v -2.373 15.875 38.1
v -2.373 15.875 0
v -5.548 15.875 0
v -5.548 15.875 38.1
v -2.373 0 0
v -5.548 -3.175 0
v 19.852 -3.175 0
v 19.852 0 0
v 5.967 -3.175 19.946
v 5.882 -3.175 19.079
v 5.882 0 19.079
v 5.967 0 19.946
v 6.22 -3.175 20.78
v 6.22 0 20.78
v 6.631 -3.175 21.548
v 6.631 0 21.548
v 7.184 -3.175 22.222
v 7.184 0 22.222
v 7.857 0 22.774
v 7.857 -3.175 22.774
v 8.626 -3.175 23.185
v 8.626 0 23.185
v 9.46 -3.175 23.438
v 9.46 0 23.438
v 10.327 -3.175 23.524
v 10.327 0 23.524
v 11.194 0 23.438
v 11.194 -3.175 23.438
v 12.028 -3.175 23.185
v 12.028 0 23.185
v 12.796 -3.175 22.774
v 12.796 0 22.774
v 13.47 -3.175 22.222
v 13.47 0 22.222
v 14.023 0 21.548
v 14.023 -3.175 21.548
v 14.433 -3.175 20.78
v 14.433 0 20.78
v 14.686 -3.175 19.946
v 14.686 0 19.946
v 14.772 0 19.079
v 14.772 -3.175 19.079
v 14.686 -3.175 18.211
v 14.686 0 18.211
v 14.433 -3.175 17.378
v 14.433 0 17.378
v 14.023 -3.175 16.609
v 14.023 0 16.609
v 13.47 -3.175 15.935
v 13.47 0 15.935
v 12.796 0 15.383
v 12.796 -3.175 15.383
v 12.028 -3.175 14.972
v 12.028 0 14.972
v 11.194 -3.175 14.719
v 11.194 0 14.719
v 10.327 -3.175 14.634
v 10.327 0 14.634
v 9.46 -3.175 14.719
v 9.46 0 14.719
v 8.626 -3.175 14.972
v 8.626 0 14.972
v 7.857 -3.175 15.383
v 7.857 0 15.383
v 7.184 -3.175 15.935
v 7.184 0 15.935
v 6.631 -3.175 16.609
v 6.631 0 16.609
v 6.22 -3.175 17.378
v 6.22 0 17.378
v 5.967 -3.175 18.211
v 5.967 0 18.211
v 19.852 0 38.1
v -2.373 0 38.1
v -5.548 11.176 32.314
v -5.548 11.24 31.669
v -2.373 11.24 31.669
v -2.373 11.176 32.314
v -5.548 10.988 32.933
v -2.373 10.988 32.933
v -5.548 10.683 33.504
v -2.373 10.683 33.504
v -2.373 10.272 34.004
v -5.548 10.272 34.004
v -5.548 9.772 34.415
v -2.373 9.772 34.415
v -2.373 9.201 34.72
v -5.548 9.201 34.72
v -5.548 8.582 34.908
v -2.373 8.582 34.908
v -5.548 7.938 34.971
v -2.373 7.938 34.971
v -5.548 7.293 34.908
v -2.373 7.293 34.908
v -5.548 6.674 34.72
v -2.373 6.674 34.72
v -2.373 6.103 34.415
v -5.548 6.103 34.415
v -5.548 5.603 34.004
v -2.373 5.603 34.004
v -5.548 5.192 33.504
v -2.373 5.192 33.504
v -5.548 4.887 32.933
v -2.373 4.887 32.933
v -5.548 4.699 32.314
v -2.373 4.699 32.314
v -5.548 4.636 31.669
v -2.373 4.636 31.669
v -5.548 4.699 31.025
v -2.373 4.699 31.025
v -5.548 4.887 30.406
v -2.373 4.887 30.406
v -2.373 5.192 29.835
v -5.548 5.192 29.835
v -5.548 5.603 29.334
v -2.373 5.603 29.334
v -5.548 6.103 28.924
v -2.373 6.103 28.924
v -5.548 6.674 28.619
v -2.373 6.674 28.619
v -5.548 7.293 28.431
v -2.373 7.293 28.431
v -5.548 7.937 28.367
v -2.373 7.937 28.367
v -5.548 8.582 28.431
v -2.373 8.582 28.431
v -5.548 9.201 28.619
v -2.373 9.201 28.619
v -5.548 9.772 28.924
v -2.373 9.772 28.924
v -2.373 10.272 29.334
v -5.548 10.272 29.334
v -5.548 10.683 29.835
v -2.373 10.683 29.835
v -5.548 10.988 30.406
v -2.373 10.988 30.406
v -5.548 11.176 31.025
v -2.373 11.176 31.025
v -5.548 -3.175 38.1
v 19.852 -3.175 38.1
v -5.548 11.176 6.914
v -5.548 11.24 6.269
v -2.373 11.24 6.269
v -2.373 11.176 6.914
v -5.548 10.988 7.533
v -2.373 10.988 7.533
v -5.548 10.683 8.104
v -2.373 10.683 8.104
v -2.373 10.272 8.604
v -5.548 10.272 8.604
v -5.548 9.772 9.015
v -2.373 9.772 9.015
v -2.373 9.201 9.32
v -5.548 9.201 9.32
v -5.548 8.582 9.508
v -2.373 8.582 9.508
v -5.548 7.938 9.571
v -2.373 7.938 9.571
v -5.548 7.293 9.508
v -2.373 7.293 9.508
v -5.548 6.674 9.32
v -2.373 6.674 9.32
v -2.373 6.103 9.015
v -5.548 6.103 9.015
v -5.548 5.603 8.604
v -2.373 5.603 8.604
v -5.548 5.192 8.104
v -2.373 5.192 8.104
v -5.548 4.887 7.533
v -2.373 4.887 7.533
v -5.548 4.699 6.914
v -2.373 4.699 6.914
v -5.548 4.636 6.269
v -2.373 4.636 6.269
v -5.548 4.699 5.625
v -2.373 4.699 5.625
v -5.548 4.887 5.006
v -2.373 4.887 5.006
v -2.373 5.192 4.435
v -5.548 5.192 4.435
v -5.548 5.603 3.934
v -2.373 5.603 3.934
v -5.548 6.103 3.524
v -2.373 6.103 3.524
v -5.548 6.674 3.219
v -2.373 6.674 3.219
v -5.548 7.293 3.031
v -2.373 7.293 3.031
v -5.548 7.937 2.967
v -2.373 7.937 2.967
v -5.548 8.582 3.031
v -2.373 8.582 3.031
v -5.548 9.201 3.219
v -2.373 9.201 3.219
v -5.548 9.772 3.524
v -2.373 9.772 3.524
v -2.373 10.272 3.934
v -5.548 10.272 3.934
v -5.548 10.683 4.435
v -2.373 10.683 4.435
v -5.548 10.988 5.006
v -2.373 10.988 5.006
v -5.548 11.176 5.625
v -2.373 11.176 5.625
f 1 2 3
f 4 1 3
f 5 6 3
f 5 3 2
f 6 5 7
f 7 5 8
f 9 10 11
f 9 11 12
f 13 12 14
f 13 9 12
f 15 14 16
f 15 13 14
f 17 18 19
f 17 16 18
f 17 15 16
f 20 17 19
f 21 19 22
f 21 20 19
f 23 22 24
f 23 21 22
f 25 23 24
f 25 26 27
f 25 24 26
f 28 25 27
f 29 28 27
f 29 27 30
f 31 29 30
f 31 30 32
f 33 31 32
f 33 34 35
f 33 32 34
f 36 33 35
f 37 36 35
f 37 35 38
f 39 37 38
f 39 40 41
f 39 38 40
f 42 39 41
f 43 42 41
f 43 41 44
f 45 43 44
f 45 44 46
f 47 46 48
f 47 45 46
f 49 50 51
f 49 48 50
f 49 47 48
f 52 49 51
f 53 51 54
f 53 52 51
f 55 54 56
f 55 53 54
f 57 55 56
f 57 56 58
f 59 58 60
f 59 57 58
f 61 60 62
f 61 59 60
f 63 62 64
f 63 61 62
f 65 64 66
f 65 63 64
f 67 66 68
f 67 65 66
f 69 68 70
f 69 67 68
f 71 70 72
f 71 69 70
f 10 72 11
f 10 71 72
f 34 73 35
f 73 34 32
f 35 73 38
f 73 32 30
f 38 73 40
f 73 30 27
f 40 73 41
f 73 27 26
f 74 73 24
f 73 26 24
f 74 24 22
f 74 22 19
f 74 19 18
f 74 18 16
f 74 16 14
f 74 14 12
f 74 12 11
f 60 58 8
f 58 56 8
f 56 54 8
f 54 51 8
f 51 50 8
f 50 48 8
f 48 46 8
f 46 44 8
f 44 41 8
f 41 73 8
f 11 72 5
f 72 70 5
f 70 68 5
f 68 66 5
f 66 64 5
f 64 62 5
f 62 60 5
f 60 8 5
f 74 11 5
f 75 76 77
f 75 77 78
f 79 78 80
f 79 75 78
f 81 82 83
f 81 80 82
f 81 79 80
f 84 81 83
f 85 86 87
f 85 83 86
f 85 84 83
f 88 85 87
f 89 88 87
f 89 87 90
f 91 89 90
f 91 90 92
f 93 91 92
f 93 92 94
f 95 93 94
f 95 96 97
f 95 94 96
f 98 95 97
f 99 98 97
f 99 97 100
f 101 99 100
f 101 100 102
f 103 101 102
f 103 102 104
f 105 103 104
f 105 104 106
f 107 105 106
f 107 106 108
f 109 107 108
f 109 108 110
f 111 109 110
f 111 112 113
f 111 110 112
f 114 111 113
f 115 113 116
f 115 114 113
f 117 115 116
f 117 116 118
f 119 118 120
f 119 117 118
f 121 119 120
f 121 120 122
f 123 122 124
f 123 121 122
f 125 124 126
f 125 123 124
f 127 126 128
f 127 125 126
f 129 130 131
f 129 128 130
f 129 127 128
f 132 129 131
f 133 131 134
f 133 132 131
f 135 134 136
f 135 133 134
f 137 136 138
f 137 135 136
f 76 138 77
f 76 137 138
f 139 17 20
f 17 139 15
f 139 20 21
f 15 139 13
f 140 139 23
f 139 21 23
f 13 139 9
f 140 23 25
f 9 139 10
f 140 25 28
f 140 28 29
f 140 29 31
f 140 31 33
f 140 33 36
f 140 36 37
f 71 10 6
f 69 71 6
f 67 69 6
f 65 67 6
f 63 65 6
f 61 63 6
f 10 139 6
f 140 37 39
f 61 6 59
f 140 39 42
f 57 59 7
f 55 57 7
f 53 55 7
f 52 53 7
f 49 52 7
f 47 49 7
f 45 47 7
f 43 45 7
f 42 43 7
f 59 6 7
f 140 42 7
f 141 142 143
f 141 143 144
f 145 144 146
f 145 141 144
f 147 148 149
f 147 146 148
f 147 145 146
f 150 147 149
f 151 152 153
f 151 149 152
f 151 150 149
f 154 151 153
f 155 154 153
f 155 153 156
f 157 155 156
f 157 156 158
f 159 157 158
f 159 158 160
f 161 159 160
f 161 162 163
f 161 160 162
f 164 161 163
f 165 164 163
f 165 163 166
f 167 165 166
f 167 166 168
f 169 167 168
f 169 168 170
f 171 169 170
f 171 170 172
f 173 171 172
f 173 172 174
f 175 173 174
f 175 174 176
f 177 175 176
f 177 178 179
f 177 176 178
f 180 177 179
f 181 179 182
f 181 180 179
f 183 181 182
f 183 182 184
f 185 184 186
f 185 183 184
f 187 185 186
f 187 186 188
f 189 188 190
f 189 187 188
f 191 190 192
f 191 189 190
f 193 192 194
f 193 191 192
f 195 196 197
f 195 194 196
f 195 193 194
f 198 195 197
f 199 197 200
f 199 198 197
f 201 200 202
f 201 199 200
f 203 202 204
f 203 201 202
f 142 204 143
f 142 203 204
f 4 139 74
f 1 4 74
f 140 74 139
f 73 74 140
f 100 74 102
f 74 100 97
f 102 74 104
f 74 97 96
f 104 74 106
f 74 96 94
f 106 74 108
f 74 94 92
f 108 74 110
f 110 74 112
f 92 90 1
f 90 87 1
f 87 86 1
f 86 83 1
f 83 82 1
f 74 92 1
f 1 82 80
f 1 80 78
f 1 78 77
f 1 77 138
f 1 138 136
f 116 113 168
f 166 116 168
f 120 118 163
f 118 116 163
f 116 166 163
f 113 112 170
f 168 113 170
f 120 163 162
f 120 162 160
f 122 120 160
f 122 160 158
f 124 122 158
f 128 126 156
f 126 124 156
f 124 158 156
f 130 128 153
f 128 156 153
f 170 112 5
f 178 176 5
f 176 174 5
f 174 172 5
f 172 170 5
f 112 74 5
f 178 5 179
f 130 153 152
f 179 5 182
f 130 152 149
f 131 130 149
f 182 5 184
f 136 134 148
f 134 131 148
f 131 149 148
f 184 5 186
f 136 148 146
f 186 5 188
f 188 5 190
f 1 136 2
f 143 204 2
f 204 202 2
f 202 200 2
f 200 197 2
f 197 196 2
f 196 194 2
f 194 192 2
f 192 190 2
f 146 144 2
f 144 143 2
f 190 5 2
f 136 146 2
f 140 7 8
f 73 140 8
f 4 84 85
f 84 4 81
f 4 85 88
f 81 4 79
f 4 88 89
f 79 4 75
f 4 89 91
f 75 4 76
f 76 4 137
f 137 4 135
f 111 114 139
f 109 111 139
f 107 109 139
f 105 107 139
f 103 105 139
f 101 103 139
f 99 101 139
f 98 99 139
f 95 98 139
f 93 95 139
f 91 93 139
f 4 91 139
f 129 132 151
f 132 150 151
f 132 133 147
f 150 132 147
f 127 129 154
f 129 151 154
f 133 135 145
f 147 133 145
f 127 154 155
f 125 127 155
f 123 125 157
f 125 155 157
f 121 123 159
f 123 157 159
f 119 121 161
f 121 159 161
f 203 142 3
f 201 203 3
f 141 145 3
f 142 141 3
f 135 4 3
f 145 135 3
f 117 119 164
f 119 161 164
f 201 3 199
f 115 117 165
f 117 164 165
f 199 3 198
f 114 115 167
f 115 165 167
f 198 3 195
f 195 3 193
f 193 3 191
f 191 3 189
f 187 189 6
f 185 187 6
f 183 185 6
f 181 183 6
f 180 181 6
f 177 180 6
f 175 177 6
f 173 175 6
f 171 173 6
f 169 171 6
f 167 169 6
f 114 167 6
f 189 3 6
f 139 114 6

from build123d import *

# Parameters (mm, degrees)
BOSS_EXTRUDE2_DEPTH     = 38.1
CUT_EXTRUDE1_DEPTH      = 46.800854849
CUT_EXTRUDE1_DEPTH_BACK = 46.800854849
SKETCH2_R               = 4.445
CUT_EXTRUDE3_DEPTH      = 47.878313216
CUT_EXTRUDE3_DEPTH_BACK = 47.878313216
SKETCH3_R               = 3.302


with BuildPart() as part:
    # Sketch1 → Boss-Extrude2 (new body)
    with BuildSketch(Plane.XY):
        Polygon((-5.548232323, 15.875), (-5.548232323, -3.175), (19.851767677, -3.175), (19.851767677, 0), (-2.373232323, 0), (-2.373232323, 15.875), align=None)
    extrude(amount=BOSS_EXTRUDE2_DEPTH)

    # Sketch2 → Cut-Extrude1 (cut, two sides: drawn at the far end of the back side and taken through both)
    with BuildSketch(Plane(origin=(0, 0, 0), x_dir=(1, 0, 0), z_dir=(0, 1, 0)).offset(-CUT_EXTRUDE1_DEPTH_BACK)):
        with Locations(Location((10.326767677, -19.078550513, 0), (0, 0, 180))):
            Circle(SKETCH2_R)
    extrude(amount=CUT_EXTRUDE1_DEPTH + CUT_EXTRUDE1_DEPTH_BACK, mode=Mode.SUBTRACT)

    # Sketch3 → Cut-Extrude3 (cut, two sides: drawn at the far end of the back side and taken through both)
    with BuildSketch(Plane(origin=(-2.373232323, 0, 0), x_dir=(0, 0, -1), z_dir=(1, 0, 0)).offset(-CUT_EXTRUDE3_DEPTH_BACK)):
        with Locations(Location((-6.269326955, 7.9375, 0), (0, 0, 90))):
            Circle(SKETCH3_R)
        with Locations(Location((-31.669326955, 7.9375, 0), (0, 0, 90))):
            Circle(SKETCH3_R)
    extrude(amount=CUT_EXTRUDE3_DEPTH + CUT_EXTRUDE3_DEPTH_BACK, mode=Mode.SUBTRACT)


solid = part.part
